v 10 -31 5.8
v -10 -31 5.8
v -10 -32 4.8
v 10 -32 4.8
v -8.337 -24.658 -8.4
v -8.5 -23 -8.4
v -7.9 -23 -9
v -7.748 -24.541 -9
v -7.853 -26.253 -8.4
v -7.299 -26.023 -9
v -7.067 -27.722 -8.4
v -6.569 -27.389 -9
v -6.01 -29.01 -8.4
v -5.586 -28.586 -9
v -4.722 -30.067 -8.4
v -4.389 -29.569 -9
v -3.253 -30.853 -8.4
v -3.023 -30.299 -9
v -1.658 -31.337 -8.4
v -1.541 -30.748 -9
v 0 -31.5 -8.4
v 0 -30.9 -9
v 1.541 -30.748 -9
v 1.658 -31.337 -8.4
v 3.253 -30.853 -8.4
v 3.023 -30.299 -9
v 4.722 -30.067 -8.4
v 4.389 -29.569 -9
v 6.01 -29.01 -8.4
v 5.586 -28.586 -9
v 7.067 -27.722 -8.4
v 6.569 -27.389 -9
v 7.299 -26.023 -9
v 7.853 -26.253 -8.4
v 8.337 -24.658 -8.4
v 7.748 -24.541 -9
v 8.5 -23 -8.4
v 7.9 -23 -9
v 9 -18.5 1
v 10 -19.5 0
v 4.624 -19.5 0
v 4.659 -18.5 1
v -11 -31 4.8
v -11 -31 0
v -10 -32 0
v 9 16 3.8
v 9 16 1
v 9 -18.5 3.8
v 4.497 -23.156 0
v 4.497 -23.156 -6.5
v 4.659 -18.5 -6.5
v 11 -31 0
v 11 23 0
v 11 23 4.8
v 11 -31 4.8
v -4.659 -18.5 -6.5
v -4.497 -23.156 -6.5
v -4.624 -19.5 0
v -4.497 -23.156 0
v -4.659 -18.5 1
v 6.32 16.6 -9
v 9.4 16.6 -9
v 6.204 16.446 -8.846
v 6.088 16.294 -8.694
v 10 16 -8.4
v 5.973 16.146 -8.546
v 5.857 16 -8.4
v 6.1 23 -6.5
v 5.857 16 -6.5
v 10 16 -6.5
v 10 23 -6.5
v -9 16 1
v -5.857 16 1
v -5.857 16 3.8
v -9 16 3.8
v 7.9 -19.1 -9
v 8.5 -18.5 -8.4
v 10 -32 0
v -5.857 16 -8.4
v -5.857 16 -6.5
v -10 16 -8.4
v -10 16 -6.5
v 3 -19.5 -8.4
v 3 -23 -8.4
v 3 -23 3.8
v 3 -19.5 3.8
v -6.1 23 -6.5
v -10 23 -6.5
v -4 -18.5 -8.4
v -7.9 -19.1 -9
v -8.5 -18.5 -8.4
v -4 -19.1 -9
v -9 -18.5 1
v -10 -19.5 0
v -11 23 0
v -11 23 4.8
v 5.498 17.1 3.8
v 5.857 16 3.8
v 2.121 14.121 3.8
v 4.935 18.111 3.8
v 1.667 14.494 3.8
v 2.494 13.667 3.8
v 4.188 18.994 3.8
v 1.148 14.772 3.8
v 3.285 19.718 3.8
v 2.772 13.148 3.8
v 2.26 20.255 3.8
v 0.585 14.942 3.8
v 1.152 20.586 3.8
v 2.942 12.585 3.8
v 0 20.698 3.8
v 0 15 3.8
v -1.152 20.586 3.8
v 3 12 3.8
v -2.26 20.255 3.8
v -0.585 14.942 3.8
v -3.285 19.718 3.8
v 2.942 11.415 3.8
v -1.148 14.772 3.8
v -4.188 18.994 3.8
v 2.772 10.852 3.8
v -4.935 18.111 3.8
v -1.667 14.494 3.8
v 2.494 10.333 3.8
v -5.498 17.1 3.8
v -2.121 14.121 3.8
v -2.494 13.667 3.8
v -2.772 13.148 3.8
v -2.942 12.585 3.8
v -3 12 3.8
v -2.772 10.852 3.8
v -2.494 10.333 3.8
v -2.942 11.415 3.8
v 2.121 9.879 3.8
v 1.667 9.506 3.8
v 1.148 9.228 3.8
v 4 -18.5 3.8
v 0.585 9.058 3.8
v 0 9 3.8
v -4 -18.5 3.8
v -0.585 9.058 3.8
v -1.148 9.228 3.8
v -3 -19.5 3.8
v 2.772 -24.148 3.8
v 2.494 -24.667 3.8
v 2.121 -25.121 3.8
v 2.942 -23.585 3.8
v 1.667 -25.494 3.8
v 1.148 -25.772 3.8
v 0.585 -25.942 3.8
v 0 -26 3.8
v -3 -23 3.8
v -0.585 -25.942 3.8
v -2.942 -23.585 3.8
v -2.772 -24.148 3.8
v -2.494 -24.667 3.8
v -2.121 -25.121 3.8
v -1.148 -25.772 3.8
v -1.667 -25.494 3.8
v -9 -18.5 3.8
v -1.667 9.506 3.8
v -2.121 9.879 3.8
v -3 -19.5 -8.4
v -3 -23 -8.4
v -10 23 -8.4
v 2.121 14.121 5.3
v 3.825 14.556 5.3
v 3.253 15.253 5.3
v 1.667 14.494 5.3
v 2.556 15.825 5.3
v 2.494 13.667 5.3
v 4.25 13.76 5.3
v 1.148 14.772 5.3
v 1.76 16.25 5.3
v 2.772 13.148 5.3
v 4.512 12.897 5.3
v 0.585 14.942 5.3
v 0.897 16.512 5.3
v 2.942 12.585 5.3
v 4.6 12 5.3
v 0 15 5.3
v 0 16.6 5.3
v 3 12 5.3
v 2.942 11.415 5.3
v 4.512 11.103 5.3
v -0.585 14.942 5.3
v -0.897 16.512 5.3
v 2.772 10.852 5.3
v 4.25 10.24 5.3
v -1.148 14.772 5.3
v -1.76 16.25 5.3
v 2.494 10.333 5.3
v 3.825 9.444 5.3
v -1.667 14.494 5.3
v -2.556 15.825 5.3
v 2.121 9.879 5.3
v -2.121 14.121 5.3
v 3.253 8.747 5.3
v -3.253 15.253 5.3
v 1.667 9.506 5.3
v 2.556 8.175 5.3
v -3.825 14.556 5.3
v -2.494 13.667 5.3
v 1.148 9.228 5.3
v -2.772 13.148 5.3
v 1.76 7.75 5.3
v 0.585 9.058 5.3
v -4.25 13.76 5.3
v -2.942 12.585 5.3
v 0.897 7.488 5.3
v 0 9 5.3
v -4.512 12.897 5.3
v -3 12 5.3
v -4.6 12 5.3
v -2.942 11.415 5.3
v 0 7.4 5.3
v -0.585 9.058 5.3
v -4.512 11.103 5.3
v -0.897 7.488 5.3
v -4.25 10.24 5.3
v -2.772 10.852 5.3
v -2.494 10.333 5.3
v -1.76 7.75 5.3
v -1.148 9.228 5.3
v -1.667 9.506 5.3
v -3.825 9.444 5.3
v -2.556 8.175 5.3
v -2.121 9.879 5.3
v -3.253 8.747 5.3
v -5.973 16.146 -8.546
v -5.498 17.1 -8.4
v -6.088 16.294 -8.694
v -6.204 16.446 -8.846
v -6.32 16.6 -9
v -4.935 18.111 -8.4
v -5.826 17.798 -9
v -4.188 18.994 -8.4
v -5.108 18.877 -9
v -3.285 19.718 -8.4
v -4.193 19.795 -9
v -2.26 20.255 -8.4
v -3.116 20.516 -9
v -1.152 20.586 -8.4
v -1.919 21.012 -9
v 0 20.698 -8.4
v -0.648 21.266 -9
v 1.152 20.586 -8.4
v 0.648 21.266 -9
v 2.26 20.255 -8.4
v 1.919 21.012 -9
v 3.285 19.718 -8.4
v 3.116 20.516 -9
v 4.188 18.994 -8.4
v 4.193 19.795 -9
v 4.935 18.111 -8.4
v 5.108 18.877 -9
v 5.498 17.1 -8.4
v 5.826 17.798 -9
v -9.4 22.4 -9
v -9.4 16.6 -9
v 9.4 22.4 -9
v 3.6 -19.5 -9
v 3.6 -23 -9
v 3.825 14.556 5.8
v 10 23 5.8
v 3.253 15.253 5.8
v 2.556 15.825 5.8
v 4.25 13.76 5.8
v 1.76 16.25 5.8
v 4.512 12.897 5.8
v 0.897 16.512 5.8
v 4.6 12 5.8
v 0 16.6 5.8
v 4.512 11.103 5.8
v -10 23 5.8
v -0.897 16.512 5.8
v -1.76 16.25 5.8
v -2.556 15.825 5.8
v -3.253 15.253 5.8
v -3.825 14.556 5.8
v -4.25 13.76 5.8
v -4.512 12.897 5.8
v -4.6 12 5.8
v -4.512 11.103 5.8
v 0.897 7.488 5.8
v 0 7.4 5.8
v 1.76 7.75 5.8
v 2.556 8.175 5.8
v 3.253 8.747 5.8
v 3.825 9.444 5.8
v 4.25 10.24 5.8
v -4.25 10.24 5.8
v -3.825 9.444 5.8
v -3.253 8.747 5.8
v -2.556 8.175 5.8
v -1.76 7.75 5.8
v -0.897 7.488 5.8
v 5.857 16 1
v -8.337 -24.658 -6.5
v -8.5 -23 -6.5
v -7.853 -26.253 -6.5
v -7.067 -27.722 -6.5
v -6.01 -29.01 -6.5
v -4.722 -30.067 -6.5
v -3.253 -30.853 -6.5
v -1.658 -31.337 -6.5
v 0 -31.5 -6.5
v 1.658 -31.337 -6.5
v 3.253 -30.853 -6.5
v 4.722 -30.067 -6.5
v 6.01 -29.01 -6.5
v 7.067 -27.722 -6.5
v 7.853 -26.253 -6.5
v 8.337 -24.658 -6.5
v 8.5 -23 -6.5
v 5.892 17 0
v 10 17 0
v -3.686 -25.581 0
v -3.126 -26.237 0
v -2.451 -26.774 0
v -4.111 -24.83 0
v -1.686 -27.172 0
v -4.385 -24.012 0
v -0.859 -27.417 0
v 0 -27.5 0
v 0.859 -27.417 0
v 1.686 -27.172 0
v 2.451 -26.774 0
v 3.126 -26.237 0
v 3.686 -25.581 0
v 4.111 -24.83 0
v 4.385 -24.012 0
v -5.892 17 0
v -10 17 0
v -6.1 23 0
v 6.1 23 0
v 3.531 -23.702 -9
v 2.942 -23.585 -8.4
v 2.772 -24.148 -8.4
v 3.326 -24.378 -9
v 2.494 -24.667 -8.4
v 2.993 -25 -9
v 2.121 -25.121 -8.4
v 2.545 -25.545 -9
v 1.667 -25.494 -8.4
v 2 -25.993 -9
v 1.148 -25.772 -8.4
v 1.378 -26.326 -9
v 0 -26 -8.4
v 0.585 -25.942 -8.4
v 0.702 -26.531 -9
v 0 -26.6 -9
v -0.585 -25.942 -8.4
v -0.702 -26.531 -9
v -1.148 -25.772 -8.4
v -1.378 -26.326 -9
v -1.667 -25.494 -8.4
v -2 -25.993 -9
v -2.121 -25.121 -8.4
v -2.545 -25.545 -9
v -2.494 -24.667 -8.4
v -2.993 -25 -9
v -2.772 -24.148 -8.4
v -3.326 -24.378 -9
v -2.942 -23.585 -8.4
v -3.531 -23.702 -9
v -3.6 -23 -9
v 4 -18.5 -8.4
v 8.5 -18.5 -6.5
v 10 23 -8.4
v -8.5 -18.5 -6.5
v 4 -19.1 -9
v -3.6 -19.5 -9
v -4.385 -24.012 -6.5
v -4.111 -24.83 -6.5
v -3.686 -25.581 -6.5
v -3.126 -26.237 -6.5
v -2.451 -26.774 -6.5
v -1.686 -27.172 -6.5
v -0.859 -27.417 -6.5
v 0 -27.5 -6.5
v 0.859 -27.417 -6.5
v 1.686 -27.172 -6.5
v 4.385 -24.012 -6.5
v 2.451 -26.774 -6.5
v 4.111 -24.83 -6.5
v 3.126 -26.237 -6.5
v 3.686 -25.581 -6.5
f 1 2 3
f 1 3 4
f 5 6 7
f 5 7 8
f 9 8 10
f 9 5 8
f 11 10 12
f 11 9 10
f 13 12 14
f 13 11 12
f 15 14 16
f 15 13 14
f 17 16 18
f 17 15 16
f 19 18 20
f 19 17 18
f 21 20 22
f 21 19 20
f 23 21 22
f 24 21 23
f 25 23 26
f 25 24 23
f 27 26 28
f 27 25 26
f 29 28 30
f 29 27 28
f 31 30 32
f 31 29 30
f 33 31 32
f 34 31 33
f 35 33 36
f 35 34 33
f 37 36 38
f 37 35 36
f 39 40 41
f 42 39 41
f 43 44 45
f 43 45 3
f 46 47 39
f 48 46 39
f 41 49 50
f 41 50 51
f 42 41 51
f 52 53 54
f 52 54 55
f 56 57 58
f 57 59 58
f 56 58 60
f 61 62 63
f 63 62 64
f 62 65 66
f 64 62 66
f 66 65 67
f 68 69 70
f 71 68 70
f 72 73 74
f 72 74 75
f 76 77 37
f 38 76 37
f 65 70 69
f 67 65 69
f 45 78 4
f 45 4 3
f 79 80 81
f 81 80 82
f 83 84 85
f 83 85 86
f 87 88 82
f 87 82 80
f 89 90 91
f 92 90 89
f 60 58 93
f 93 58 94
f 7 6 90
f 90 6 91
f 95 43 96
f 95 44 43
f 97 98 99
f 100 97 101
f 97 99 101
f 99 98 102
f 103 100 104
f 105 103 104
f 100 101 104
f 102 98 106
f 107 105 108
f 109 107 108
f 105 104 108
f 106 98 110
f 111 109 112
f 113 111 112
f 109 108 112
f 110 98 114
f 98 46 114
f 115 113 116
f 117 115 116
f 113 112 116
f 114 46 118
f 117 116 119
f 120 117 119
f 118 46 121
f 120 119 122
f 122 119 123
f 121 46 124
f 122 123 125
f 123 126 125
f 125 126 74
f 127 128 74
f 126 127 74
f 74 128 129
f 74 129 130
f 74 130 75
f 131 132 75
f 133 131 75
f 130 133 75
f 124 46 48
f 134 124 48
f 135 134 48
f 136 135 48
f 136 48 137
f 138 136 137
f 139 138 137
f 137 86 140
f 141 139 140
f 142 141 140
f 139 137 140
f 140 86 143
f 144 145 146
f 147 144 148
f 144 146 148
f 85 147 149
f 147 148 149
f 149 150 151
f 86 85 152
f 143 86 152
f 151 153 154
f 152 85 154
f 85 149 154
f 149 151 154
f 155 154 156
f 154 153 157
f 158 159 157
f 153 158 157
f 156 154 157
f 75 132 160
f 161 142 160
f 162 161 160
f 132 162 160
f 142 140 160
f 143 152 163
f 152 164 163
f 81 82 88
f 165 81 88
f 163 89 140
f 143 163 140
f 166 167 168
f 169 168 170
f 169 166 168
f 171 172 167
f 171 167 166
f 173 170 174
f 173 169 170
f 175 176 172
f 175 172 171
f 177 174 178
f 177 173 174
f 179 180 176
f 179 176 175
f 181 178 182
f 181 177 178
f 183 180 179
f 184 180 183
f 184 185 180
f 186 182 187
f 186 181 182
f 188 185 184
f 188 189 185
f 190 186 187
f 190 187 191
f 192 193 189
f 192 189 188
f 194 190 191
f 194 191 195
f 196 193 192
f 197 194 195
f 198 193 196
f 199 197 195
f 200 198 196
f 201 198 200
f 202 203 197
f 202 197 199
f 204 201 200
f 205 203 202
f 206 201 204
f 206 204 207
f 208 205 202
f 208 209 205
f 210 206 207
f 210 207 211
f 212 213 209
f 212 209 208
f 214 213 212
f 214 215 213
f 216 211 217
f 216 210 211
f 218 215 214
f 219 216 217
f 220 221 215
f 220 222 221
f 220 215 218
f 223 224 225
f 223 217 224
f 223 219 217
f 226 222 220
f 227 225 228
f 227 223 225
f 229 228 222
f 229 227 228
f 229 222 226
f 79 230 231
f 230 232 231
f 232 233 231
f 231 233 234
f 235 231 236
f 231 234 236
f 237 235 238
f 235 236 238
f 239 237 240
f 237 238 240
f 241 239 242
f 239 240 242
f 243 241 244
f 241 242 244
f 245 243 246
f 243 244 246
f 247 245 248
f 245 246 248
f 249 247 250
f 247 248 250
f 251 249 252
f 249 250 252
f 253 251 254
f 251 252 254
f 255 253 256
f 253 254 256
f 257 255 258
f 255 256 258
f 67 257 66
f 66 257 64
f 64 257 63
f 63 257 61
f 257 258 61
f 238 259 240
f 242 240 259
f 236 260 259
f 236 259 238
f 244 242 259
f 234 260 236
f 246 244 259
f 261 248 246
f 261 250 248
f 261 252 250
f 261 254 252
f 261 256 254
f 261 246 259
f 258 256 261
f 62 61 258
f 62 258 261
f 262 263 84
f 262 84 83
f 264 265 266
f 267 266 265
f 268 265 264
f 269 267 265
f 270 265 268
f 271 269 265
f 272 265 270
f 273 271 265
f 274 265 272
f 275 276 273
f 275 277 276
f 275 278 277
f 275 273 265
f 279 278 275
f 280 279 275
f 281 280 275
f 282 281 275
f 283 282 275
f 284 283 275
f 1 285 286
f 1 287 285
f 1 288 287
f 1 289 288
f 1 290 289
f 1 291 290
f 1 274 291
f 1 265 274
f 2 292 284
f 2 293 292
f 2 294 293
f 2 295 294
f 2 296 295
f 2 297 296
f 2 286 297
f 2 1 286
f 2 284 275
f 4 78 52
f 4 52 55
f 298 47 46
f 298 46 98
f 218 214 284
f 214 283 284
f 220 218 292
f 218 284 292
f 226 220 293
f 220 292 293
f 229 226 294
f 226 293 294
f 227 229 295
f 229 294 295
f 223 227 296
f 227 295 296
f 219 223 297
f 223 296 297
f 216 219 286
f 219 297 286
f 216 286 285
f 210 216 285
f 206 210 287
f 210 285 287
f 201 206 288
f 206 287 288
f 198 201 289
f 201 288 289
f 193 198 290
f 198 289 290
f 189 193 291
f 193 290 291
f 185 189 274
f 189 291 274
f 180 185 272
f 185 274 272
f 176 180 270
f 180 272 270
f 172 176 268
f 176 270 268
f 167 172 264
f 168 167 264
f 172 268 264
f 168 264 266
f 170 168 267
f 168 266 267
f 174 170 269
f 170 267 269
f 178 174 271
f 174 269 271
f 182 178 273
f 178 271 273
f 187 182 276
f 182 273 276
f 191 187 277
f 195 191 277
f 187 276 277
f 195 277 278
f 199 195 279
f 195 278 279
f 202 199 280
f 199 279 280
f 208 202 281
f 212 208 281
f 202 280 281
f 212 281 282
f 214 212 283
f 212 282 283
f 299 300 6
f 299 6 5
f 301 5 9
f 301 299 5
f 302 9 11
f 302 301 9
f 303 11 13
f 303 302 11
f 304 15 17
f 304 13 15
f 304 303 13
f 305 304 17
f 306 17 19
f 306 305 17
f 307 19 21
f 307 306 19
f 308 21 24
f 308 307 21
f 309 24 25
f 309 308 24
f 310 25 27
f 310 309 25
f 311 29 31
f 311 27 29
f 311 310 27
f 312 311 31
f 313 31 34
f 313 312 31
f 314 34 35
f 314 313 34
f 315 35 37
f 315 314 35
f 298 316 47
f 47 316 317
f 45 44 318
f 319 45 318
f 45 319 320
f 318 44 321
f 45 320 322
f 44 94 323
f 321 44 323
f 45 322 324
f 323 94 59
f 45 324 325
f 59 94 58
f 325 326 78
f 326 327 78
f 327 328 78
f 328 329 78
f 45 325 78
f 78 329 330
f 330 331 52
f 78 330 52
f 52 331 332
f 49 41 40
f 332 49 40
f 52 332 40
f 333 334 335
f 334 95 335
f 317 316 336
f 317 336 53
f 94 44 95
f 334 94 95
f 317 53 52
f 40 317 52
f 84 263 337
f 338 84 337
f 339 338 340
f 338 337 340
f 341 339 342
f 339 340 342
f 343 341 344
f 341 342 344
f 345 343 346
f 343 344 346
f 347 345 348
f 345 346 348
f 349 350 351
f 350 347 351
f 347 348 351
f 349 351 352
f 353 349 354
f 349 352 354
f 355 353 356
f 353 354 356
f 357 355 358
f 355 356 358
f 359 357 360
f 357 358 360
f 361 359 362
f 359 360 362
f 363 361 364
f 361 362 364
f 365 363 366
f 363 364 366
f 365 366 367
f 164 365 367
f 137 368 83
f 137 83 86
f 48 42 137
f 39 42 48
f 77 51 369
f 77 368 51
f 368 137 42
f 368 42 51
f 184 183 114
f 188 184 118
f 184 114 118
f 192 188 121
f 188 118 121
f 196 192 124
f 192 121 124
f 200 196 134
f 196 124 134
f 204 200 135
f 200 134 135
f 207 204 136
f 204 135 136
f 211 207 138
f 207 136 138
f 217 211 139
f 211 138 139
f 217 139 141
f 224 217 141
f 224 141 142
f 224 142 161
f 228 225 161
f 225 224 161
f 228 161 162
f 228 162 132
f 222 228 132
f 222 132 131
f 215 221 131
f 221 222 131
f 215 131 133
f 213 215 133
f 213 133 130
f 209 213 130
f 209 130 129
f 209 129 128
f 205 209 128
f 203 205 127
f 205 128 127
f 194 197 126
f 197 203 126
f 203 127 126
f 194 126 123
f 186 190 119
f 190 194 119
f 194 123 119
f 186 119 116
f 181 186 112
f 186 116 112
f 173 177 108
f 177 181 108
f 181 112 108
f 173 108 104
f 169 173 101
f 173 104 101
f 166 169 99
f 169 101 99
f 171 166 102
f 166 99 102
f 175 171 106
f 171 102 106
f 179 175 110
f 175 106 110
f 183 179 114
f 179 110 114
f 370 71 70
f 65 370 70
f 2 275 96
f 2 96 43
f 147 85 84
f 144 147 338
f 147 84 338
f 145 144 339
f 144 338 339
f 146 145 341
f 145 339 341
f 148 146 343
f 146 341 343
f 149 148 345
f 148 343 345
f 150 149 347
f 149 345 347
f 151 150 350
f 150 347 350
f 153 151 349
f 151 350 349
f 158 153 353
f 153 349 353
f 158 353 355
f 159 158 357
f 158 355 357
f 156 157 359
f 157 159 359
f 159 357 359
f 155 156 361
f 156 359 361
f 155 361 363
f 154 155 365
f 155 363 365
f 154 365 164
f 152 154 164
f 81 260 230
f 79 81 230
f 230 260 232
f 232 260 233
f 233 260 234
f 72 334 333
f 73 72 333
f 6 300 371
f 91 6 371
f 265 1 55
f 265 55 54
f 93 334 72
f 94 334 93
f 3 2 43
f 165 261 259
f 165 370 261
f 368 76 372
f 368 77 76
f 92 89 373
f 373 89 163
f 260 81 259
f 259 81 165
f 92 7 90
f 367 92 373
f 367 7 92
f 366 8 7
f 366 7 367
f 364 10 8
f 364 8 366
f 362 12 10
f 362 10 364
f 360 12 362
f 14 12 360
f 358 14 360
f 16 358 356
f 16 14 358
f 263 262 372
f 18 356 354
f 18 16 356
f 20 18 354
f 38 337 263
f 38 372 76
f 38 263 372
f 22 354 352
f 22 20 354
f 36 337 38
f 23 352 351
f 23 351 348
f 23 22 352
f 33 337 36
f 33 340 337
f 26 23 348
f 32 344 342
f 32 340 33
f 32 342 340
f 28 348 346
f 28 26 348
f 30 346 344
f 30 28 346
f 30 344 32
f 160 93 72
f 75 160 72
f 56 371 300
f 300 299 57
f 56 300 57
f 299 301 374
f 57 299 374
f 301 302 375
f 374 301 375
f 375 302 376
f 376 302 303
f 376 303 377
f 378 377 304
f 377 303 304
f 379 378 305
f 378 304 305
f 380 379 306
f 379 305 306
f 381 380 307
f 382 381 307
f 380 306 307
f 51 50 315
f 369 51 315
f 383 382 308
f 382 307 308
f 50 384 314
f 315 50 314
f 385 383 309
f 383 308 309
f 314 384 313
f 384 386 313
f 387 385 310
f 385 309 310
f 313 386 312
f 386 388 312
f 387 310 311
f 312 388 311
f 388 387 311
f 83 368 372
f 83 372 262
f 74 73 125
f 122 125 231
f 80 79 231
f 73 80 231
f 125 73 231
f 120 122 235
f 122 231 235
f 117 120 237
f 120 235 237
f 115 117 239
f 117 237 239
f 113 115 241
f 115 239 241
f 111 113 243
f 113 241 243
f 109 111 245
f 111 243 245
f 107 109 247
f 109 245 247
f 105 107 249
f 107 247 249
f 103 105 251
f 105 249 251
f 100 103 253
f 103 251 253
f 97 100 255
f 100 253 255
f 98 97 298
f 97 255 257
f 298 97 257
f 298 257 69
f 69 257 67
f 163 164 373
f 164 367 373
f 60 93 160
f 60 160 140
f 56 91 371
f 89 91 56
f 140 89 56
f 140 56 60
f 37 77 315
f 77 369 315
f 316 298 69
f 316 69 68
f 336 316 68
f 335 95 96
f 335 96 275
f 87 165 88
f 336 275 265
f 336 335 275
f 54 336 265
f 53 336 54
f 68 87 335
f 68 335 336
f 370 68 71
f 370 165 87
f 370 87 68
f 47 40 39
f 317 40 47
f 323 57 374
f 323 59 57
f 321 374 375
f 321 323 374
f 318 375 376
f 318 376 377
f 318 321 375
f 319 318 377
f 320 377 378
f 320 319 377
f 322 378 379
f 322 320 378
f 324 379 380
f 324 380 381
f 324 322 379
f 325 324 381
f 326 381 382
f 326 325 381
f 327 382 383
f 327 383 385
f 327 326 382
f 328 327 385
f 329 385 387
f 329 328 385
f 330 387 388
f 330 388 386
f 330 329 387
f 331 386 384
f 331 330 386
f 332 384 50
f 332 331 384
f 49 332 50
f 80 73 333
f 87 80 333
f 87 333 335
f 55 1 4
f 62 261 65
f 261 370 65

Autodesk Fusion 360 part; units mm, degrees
sketch "Sketch1" plane through (0, 0, 0) normal (0, 0, 1) x (1, 0, 0)
  line L0 (0, 60.043) -> (0, -60.043) construction
  line L1 (-62.1045, 0) -> (62.1045, 0) construction
  circle A0 centre (0, -23) radius 4.5
  line L2 (-4.4973, -23.1562) -> (-6.1, 23)
  line L3 (4.4973, -23.1562) -> (6.1, 23)
  line L4 (-11, 23) -> (11, 23)
  line L5 (11, 23) -> (11, -32)
  line L6 (11, -32) -> (-11, -32)
  line L7 (-11, -32) -> (-11, 23)
  line L8 (-10, 23) -> (10, 23)
  line L9 (10, 23) -> (10, 16)
  line L10 (10, 16) -> (-10, 16)
  line L11 (-10, 16) -> (-10, 23)
  circle A1 centre (0, -23) radius 8.5
  line L12 (-8.5, -23) -> (-8.5, -18.5)
  line L13 (-8.5, -18.5) -> (8.5, -18.5)
  line L14 (8.5, -18.5) -> (8.5, -23)
  circle A2 centre (0, -23) radius 3
  line L15 (-3, -23) -> (-3, -18.5)
  line L16 (3, -23) -> (3, -18.5)
  arc A3 (5.8569, 16) -> (-5.8569, 16) centre (0, 14.6976) ccw
  circle A4 centre (0, 12) radius 3
  line L17 (9, 21) -> (9, -30)
  line L18 (9, -30) -> (-9, -30)
  line L19 (-9, -30) -> (-9, 21)
  line L20 (-9, 21) -> (9, 21)
  line L21 (8.5, -18.5) -> (9, -18.5)
  line L22 (-8.5, -18.5) -> (-9, -18.5)
  dimension "d1" = 9
  dimension "d2" = 23
  dimension "d3" = 12.2
  dimension "d4" = 6.1
  dimension "d5" = 46
  dimension "d7" = 22
  dimension "d8" = 55
  dimension "d9" = 11
  dimension "d10" = 20
  dimension "d11" = 7
  dimension "d12" = 10
  dimension "d13" = 17
  dimension "d14" = 6
  dimension "d21" = 6
  dimension "d24" = 6
  dimension "d25" = 12
  dimension "d29" = 2
extrude "Extrude1" add sketch "Sketch1" along normal blind 3.8 contours A0 A2 L15 L16 | A0 L2 L13 L15 | A0 L2 L3 A1 L13 L18 | A0 L3 L13 L16 | A1 L12 L13 | A1 L13 L14 | L2 L10 L19 L20 | L2 L3 A3 L20 | A1 L12 L18 L19 L22 | L3 L10 L17 L20 | A1 L14 L17 L18 L21 | L2 L4 L8 L10 L11 L19 L20 | L2 L3 L4 L8 L20 | L4 L5 L6 L7 L9 L10 L11 A1 L17 L18 L19 | A1 L18 | L3 L4 L8 L9 L10 L17 L20 picked at (3.9634, -23.4711)
extrude "Extrude2" add sketch "Sketch1" against normal blind 6.5 contours A0 A2 L15 L16 | A0 L2 L13 L15 | A0 L3 L13 L16 | L2 L3 A3 L20 | L2 L3 L4 L8 L20 picked at (3.9634, -23.4711)
sketch "Sketch2" plane through (0, 0, -6.5) normal (0, 0, -1) x (1, 0, 0)
  line L0 (-5.8569, -16) -> (-6.1, -23)
  line L1 (-6.1, -23) -> (6.1, -23)
  line L2 (6.1, -23) -> (5.8569, -16)
  line L3 (10, -23) -> (10, -16)
  line L4 (10, -16) -> (-10, -16)
  line L5 (-10, -16) -> (-10, -23)
  line L6 (-10, -23) -> (10, -23)
  line L7 (-8.5, 18.5) -> (8.5, 18.5)
  line L8 (8.5, 18.5) -> (8.5, 23)
  circle A0 centre (0, 23) radius 8.5
  line L9 (-8.5, 23) -> (-8.5, 18.5)
  line L10 (-3, 18.5) -> (-3, 23)
  arc A1 (3, 23) -> (-3, 23) centre (0, 23) ccw
  line L11 (3, 23) -> (3, 18.5)
  line L12 (3, 18.5) -> (4.659, 18.5)
  line L13 (4.659, 18.5) -> (4.4973, 23.1562)
  arc A2 (4.4973, 23.1562) -> (-4.4973, 23.1562) centre (0, 23) ccw
  line L14 (-4.4973, 23.1562) -> (-4.659, 18.5)
  line L15 (-4.659, 18.5) -> (-3, 18.5)
  arc A3 (-5.8569, -16) -> (5.8569, -16) centre (0, -14.6976) ccw
  arc A4 (-5.8569, -16) -> (5.8569, -16) centre (0, -14.6976) ccw
extrude "Extrude3" add sketch "Sketch2" along normal blind 2.5 contours L0 L1 L2 L6 A3 A4 | L0 L4 L5 L6 | L2 L3 L4 L6 | L7 L10 A1 L11 L12 L13 A2 L14 L15 | L7 A0 L13 A2 L14 | L7 A0 L9 | L7 L8 A0
sketch "Sketch3" plane through (0, 0, 3.8) normal (0, 0, 1) x (-1, 0, 0)
  arc A0 (3, 23) -> (-3, 23) centre (0, 23) ccw
  line L0 (3, 23) -> (3, 18.5)
  line L1 (3, 18.5) -> (9, 18.5)
  arc A1 (-5.8569, -16) -> (5.8569, -16) centre (0, -14.6976) ccw
  line L2 (-9, 18.5) -> (-3, 18.5)
  line L3 (-3, 18.5) -> (-3, 23)
  line L4 (-11, -23) -> (11, -23)
  line L5 (11, -23) -> (11, 32)
  line L6 (11, 32) -> (-11, 32)
  line L7 (-11, 32) -> (-11, -23)
  line L8 (-11, -23) -> (11, -23)
  line L9 (11, -23) -> (11, 32)
  line L10 (-11, 32) -> (-11, -23)
  line L11 (11, 32) -> (-11, 32)
  line L12 (-9, -16) -> (-9, 18.5)
  line L13 (9, 18.5) -> (9, -16)
  line L14 (9, -16) -> (5.8569, -16)
  line L15 (-5.8569, -16) -> (-9, -16)
extrude "Extrude4" add sketch "Sketch3" along normal blind 2 contours A0 L0 L1 A1 L2 L3 L12 L13 L14 L15 | L4 L5 L6 L7 L8 L9 L10 L11
extrude "Extrude5" cut sketch "Sketch1" along normal blind 11 contours A4
sketch "Sketch4" plane through (0, 0, 5.8) normal (0, 0, 1) x (-1, 0, 0)
  circle A0 centre (0, -12) radius 3
  line L0 (11, 32) -> (-11, 32)
  line L1 (-11, 32) -> (-11, -23)
  line L2 (-11, -23) -> (11, -23)
  line L3 (11, -23) -> (11, 32)
  circle A1 centre (0, -12) radius 3
  circle A2 centre (0, -12) radius 4.6
  dimension "d30" = 9.2
  dimension "d39" = 22
extrude "Extrude6" cut sketch "Sketch4" against normal blind 0.5 contours A2
chamfer "Chamfer1" distance 1 angle 45 13 edges at (11, -4.5, 5.8) (-11, -4.5, 5.8) (0, -32, 5.8) (-11, -32, 2.9) (11, -32, 2.9) (3, -18.5, -2.6) (-3, -18.5, -2.6) (6.8295, -18.5, 0) (-6.8295, -18.5, 0) (-9, -1.25, 0) (9, -1.25, 0) (7.4285, 16, 0) (-7.4285, 16, 0)
chamfer "Chamfer1" distance 0.6 angle 45 2 faces at (-4.8333, -20, -9) (-8.4185, 18.8641, -9)
equation "d2 = ( 46 / 2 ) * 1 mm"
equation "d4 = d3 / 2"
equation "d5 = d2 * 2"
equation "d8 = d5 + 9 mm"
equation "d9 = d7 / 2"
equation "d12 = d10 / 2"
